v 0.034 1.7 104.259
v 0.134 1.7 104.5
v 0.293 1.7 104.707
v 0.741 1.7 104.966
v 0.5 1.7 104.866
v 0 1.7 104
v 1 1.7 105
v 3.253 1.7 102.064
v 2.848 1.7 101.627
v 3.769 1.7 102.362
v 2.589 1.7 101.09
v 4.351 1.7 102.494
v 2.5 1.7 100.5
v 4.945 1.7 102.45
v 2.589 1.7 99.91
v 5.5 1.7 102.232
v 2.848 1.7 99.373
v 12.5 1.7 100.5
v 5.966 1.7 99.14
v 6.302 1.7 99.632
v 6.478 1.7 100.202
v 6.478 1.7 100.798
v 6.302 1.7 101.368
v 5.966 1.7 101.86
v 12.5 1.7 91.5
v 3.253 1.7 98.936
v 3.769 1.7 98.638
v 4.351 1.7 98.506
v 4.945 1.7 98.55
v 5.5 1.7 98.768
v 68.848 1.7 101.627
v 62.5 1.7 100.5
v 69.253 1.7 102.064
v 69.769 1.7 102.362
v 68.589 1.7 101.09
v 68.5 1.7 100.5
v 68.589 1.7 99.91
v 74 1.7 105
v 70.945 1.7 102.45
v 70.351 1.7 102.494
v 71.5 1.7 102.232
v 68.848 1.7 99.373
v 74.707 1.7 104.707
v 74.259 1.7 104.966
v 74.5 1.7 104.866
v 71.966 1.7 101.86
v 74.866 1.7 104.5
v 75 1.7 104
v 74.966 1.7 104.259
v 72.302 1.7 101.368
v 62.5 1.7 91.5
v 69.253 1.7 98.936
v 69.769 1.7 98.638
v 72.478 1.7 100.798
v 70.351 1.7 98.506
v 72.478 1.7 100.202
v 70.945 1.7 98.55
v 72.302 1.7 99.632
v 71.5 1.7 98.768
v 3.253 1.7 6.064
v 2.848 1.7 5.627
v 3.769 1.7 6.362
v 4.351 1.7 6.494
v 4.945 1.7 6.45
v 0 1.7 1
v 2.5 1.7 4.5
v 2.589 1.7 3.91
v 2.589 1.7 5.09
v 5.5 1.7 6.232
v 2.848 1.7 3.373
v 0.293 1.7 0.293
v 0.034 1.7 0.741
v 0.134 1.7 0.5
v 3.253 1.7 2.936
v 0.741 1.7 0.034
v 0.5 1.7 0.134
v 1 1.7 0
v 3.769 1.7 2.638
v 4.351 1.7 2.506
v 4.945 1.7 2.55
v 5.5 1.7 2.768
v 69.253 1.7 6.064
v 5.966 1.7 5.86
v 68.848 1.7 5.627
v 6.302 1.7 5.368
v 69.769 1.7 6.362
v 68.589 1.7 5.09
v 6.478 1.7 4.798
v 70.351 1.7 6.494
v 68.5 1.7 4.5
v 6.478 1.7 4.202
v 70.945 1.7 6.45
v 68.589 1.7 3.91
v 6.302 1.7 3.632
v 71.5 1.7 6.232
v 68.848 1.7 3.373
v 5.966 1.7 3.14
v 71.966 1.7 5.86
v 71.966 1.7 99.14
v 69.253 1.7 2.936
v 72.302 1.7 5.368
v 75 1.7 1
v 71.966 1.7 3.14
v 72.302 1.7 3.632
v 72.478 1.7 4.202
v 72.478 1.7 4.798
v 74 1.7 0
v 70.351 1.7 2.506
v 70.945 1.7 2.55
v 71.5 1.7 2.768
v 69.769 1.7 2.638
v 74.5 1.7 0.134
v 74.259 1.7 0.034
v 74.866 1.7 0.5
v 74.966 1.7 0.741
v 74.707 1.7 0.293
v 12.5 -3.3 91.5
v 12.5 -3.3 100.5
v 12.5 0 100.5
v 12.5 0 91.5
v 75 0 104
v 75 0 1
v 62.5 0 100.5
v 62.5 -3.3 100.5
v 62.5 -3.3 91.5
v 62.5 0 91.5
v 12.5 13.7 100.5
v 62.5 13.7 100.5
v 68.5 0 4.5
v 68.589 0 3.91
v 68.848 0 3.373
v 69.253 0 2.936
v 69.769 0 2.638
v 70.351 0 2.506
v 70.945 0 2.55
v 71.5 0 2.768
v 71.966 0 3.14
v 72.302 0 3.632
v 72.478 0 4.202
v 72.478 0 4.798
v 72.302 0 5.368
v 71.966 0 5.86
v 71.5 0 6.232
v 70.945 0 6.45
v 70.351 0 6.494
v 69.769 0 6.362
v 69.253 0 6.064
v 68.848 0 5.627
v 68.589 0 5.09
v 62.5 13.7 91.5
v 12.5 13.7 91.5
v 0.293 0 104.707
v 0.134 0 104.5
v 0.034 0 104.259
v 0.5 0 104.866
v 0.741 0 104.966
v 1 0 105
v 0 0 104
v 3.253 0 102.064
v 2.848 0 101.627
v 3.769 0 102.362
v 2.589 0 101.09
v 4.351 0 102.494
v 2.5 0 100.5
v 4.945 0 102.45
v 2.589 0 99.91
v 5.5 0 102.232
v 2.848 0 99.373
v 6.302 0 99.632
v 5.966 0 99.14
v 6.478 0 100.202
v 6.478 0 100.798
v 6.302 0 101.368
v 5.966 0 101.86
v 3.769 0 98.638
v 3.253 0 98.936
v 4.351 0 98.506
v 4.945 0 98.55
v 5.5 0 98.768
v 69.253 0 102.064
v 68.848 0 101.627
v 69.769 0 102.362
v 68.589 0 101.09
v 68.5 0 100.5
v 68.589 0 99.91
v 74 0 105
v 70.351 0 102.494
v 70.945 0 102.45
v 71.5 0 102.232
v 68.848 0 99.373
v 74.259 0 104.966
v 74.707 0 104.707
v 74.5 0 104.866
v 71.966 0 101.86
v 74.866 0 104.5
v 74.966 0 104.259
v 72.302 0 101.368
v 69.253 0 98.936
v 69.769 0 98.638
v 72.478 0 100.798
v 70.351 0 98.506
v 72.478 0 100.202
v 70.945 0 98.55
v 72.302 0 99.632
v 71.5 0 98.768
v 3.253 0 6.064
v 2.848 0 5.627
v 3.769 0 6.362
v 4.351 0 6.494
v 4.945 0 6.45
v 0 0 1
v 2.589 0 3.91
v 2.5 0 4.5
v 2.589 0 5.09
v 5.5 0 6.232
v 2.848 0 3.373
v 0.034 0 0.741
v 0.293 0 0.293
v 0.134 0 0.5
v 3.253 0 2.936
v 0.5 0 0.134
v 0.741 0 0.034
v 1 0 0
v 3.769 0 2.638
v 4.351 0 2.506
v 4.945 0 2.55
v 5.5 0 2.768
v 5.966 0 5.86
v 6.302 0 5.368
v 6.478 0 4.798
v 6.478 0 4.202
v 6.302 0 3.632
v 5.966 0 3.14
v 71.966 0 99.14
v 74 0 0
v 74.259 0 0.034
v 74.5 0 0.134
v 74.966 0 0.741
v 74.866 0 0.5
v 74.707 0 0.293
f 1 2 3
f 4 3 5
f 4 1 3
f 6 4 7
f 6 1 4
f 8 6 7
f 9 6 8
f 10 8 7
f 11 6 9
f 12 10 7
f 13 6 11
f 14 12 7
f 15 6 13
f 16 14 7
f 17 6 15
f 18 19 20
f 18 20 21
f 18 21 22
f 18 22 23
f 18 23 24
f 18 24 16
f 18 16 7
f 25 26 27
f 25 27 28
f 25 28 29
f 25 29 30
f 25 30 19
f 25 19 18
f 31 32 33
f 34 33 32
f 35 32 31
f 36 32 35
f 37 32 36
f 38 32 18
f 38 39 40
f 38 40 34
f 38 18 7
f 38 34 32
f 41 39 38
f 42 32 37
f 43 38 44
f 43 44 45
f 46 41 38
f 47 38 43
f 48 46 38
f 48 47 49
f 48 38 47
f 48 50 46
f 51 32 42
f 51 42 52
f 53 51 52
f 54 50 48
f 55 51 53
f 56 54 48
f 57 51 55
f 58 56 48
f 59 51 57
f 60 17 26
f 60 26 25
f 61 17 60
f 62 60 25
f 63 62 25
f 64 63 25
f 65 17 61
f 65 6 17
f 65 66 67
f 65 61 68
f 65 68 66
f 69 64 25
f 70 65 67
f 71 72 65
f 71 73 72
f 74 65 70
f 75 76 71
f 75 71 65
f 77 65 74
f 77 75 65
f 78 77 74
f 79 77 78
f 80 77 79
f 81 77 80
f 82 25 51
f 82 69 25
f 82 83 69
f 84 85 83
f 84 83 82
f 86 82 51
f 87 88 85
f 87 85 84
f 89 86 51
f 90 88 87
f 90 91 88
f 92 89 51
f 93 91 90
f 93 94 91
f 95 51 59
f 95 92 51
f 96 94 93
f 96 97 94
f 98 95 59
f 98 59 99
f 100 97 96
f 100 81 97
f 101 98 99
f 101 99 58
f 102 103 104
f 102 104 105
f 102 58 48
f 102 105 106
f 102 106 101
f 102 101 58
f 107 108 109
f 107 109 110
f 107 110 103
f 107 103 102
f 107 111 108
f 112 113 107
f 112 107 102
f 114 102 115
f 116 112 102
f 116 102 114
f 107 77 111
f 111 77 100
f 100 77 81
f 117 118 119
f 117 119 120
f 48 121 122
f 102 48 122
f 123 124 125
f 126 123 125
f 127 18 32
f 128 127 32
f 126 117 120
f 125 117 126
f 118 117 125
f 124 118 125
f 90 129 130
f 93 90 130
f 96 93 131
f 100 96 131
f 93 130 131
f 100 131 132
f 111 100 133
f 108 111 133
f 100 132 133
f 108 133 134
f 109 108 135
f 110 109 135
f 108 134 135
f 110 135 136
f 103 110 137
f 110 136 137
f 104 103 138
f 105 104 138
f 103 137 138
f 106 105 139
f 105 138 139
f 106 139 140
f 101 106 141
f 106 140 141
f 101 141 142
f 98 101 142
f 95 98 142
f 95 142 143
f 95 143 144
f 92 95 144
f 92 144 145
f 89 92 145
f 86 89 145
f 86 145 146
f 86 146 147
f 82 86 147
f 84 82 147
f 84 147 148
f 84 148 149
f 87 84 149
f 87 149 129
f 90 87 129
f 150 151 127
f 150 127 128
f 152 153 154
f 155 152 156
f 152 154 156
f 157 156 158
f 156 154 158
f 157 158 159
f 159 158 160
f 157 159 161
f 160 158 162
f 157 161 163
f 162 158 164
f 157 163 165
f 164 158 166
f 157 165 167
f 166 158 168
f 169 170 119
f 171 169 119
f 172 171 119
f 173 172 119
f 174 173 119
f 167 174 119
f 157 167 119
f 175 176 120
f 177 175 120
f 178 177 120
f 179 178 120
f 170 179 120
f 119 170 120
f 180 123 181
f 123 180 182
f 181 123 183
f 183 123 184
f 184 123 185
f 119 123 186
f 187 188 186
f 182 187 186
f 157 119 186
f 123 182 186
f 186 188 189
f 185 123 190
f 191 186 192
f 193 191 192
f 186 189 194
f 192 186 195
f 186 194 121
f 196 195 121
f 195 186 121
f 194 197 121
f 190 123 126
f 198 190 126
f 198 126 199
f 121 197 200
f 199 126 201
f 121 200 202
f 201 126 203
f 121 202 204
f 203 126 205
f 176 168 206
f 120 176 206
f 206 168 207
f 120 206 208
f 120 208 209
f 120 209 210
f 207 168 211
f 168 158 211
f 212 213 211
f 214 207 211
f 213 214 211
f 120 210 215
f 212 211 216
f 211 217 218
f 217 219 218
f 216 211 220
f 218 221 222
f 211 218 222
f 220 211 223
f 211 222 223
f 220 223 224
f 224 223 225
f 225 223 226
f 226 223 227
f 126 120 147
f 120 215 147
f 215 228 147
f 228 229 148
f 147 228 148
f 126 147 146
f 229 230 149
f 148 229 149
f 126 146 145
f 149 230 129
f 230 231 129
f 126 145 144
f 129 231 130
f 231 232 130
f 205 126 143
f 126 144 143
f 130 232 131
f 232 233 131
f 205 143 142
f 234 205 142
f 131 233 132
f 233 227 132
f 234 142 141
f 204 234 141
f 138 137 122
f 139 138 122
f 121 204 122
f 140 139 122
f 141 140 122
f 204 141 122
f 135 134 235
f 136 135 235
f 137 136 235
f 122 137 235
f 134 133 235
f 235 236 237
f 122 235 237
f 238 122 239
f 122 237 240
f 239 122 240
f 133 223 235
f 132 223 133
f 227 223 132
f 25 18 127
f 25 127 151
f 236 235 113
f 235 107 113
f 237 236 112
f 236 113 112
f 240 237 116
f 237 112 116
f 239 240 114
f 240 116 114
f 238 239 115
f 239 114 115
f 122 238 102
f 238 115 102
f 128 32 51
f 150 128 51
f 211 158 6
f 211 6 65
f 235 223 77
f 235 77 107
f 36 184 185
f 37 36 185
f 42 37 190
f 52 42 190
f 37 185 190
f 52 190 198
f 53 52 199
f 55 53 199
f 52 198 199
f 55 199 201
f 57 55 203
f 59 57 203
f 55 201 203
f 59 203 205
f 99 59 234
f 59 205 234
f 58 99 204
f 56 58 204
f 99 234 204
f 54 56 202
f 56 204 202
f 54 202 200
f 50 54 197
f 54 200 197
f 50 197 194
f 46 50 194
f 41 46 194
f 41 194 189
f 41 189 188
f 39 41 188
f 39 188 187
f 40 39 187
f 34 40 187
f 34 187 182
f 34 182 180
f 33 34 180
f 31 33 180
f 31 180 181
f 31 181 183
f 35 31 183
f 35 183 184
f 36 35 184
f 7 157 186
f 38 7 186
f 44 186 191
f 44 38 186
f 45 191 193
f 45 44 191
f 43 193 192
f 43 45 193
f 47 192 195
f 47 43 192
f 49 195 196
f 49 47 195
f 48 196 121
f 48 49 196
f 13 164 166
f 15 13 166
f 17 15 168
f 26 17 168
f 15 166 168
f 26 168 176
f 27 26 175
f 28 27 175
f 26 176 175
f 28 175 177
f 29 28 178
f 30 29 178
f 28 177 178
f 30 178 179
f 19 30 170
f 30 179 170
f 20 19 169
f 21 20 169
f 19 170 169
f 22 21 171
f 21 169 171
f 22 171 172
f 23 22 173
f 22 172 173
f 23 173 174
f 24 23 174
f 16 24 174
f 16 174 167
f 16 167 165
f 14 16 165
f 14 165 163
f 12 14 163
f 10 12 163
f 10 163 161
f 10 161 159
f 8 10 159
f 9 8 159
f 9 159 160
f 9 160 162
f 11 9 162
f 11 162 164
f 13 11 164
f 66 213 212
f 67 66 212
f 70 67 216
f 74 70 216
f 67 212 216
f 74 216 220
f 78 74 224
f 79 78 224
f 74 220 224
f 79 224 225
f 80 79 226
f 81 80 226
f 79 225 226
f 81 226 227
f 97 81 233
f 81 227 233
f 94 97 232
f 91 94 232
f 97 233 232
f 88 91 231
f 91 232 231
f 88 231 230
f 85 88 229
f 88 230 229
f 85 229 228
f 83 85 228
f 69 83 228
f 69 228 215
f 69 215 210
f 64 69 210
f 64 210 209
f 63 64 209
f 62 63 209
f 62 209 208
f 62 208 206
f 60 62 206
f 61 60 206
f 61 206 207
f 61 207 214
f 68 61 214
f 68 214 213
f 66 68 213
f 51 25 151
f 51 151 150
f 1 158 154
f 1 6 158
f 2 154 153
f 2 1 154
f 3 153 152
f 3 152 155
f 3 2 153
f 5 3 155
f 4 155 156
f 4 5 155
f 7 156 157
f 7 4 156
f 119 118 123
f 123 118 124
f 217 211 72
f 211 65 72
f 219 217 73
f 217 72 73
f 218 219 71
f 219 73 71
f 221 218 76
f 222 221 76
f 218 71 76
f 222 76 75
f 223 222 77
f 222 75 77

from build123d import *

# Parameters (mm, degrees)
ESQUISSE1_W                   = 75
ESQUISSE1_H                   = 105
BOSS_EXTRU_1_DEPTH            = 1.7
DIAM_TRE_DU_PER_AGE_4_0_4_1_D = 4
CONG_1_R                      = 1
BOSS_EXTRU_2_DEPTH            = 12
BOSS_EXTRU_2_DEPTH_BACK       = 5
ESQUISSE4_W                   = 50
ESQUISSE4_H                   = 9


with BuildPart() as part:
    # Esquisse1 → Boss.-Extru.1 (new body)
    with BuildSketch(Plane(origin=(0, 0, 0), x_dir=(1, 0, 0), z_dir=(0, 1, 0))):
        with Locations((37.5, -52.5)):
            Rectangle(ESQUISSE1_W, ESQUISSE1_H)
    extrude(amount=BOSS_EXTRU_1_DEPTH)

    # Diamètre du perçage Ø4.0 (4)1 (through all)
    with Locations(Plane(origin=(0, 1.7, 0), x_dir=(1, 0, 0), z_dir=(0, 1, 0))):
        with Locations((70.5, -100.5), (4.5, -100.5), (70.5, -4.5), (4.5, -4.5)):
            Hole(DIAM_TRE_DU_PER_AGE_4_0_4_1_D / 2)

    # Congé1
    cong_1_edges = [part.edges().sort_by_distance(p)[0] for p in [
        (0, 0.85, 0),
        (75, 0.85, 0),
        (75, 0.85, 105),
        (0, 0.85, 105),
    ]]
    fillet(cong_1_edges, radius=CONG_1_R)

    # Esquisse4 → Boss.-Extru.2 (add, two sides: drawn at the far end of the back side and taken through both)
    with BuildSketch(Plane(origin=(0, 1.7, 0), x_dir=(1, 0, 0), z_dir=(0, 1, 0)).offset(-BOSS_EXTRU_2_DEPTH_BACK)):
        with Locations((37.5, -96)):
            Rectangle(ESQUISSE4_W, ESQUISSE4_H)
    extrude(amount=BOSS_EXTRU_2_DEPTH + BOSS_EXTRU_2_DEPTH_BACK)


solid = part.part
